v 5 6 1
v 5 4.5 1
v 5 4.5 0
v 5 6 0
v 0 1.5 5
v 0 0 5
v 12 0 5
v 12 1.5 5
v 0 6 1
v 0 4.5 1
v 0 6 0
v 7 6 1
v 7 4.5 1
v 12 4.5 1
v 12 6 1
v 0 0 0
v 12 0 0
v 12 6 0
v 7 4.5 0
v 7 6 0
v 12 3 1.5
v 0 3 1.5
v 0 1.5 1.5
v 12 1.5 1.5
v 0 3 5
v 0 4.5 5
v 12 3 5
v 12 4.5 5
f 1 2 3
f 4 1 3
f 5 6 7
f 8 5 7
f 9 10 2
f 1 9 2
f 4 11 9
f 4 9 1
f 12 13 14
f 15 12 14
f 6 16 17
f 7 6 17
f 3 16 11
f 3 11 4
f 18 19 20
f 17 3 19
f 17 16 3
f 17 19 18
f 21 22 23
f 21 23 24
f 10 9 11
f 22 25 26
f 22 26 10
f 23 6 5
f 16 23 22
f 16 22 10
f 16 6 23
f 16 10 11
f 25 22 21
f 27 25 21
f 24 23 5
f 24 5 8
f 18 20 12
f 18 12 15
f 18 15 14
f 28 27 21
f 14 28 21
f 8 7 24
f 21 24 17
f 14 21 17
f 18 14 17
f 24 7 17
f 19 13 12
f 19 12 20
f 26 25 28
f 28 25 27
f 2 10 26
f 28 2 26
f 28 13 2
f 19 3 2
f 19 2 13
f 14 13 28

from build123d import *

# Parameters (mm, degrees)
SKETCH1_W           = 12
SKETCH1_H           = 5
BOSS_EXTRUDE1_DEPTH = 4.5
CUT_EXTRUDE1_START  = -1.5
SKETCH2_W           = 12
SKETCH2_H           = 3.5
CUT_EXTRUDE1_DEPTH  = 1.5
SKETCH4_W           = 5
SKETCH4_H           = 1
BOSS_EXTRUDE2_DEPTH = 1.5


with BuildPart() as part:
    # Sketch1 → Boss-Extrude1 (new body)
    with BuildSketch(Plane(origin=(0, 0, 0), x_dir=(1, 0, 0), z_dir=(0, 1, 0))):
        with Locations((6, -2.5)):
            Rectangle(SKETCH1_W, SKETCH1_H)
    extrude(amount=BOSS_EXTRUDE1_DEPTH)

    # Sketch2 → Cut-Extrude1 (cut)
    with BuildSketch(Plane(origin=(0, 4.5, 0), x_dir=(1, 0, 0), z_dir=(0, 1, 0)).offset(CUT_EXTRUDE1_START)):
        with Locations((6, -3.25)):
            Rectangle(SKETCH2_W, SKETCH2_H)
    extrude(amount=-CUT_EXTRUDE1_DEPTH, mode=Mode.SUBTRACT)

    # Sketch4 → Boss-Extrude2 (add)
    with BuildSketch(Plane(origin=(0, 4.5, 0), x_dir=(1, 0, 0), z_dir=(0, 1, 0))):
        with Locations((2.5, -0.5)):
            Rectangle(SKETCH4_W, SKETCH4_H)
        with Locations((9.5, -0.5)):
            Rectangle(SKETCH4_W, SKETCH4_H)
    extrude(amount=BOSS_EXTRUDE2_DEPTH)


solid = part.part
